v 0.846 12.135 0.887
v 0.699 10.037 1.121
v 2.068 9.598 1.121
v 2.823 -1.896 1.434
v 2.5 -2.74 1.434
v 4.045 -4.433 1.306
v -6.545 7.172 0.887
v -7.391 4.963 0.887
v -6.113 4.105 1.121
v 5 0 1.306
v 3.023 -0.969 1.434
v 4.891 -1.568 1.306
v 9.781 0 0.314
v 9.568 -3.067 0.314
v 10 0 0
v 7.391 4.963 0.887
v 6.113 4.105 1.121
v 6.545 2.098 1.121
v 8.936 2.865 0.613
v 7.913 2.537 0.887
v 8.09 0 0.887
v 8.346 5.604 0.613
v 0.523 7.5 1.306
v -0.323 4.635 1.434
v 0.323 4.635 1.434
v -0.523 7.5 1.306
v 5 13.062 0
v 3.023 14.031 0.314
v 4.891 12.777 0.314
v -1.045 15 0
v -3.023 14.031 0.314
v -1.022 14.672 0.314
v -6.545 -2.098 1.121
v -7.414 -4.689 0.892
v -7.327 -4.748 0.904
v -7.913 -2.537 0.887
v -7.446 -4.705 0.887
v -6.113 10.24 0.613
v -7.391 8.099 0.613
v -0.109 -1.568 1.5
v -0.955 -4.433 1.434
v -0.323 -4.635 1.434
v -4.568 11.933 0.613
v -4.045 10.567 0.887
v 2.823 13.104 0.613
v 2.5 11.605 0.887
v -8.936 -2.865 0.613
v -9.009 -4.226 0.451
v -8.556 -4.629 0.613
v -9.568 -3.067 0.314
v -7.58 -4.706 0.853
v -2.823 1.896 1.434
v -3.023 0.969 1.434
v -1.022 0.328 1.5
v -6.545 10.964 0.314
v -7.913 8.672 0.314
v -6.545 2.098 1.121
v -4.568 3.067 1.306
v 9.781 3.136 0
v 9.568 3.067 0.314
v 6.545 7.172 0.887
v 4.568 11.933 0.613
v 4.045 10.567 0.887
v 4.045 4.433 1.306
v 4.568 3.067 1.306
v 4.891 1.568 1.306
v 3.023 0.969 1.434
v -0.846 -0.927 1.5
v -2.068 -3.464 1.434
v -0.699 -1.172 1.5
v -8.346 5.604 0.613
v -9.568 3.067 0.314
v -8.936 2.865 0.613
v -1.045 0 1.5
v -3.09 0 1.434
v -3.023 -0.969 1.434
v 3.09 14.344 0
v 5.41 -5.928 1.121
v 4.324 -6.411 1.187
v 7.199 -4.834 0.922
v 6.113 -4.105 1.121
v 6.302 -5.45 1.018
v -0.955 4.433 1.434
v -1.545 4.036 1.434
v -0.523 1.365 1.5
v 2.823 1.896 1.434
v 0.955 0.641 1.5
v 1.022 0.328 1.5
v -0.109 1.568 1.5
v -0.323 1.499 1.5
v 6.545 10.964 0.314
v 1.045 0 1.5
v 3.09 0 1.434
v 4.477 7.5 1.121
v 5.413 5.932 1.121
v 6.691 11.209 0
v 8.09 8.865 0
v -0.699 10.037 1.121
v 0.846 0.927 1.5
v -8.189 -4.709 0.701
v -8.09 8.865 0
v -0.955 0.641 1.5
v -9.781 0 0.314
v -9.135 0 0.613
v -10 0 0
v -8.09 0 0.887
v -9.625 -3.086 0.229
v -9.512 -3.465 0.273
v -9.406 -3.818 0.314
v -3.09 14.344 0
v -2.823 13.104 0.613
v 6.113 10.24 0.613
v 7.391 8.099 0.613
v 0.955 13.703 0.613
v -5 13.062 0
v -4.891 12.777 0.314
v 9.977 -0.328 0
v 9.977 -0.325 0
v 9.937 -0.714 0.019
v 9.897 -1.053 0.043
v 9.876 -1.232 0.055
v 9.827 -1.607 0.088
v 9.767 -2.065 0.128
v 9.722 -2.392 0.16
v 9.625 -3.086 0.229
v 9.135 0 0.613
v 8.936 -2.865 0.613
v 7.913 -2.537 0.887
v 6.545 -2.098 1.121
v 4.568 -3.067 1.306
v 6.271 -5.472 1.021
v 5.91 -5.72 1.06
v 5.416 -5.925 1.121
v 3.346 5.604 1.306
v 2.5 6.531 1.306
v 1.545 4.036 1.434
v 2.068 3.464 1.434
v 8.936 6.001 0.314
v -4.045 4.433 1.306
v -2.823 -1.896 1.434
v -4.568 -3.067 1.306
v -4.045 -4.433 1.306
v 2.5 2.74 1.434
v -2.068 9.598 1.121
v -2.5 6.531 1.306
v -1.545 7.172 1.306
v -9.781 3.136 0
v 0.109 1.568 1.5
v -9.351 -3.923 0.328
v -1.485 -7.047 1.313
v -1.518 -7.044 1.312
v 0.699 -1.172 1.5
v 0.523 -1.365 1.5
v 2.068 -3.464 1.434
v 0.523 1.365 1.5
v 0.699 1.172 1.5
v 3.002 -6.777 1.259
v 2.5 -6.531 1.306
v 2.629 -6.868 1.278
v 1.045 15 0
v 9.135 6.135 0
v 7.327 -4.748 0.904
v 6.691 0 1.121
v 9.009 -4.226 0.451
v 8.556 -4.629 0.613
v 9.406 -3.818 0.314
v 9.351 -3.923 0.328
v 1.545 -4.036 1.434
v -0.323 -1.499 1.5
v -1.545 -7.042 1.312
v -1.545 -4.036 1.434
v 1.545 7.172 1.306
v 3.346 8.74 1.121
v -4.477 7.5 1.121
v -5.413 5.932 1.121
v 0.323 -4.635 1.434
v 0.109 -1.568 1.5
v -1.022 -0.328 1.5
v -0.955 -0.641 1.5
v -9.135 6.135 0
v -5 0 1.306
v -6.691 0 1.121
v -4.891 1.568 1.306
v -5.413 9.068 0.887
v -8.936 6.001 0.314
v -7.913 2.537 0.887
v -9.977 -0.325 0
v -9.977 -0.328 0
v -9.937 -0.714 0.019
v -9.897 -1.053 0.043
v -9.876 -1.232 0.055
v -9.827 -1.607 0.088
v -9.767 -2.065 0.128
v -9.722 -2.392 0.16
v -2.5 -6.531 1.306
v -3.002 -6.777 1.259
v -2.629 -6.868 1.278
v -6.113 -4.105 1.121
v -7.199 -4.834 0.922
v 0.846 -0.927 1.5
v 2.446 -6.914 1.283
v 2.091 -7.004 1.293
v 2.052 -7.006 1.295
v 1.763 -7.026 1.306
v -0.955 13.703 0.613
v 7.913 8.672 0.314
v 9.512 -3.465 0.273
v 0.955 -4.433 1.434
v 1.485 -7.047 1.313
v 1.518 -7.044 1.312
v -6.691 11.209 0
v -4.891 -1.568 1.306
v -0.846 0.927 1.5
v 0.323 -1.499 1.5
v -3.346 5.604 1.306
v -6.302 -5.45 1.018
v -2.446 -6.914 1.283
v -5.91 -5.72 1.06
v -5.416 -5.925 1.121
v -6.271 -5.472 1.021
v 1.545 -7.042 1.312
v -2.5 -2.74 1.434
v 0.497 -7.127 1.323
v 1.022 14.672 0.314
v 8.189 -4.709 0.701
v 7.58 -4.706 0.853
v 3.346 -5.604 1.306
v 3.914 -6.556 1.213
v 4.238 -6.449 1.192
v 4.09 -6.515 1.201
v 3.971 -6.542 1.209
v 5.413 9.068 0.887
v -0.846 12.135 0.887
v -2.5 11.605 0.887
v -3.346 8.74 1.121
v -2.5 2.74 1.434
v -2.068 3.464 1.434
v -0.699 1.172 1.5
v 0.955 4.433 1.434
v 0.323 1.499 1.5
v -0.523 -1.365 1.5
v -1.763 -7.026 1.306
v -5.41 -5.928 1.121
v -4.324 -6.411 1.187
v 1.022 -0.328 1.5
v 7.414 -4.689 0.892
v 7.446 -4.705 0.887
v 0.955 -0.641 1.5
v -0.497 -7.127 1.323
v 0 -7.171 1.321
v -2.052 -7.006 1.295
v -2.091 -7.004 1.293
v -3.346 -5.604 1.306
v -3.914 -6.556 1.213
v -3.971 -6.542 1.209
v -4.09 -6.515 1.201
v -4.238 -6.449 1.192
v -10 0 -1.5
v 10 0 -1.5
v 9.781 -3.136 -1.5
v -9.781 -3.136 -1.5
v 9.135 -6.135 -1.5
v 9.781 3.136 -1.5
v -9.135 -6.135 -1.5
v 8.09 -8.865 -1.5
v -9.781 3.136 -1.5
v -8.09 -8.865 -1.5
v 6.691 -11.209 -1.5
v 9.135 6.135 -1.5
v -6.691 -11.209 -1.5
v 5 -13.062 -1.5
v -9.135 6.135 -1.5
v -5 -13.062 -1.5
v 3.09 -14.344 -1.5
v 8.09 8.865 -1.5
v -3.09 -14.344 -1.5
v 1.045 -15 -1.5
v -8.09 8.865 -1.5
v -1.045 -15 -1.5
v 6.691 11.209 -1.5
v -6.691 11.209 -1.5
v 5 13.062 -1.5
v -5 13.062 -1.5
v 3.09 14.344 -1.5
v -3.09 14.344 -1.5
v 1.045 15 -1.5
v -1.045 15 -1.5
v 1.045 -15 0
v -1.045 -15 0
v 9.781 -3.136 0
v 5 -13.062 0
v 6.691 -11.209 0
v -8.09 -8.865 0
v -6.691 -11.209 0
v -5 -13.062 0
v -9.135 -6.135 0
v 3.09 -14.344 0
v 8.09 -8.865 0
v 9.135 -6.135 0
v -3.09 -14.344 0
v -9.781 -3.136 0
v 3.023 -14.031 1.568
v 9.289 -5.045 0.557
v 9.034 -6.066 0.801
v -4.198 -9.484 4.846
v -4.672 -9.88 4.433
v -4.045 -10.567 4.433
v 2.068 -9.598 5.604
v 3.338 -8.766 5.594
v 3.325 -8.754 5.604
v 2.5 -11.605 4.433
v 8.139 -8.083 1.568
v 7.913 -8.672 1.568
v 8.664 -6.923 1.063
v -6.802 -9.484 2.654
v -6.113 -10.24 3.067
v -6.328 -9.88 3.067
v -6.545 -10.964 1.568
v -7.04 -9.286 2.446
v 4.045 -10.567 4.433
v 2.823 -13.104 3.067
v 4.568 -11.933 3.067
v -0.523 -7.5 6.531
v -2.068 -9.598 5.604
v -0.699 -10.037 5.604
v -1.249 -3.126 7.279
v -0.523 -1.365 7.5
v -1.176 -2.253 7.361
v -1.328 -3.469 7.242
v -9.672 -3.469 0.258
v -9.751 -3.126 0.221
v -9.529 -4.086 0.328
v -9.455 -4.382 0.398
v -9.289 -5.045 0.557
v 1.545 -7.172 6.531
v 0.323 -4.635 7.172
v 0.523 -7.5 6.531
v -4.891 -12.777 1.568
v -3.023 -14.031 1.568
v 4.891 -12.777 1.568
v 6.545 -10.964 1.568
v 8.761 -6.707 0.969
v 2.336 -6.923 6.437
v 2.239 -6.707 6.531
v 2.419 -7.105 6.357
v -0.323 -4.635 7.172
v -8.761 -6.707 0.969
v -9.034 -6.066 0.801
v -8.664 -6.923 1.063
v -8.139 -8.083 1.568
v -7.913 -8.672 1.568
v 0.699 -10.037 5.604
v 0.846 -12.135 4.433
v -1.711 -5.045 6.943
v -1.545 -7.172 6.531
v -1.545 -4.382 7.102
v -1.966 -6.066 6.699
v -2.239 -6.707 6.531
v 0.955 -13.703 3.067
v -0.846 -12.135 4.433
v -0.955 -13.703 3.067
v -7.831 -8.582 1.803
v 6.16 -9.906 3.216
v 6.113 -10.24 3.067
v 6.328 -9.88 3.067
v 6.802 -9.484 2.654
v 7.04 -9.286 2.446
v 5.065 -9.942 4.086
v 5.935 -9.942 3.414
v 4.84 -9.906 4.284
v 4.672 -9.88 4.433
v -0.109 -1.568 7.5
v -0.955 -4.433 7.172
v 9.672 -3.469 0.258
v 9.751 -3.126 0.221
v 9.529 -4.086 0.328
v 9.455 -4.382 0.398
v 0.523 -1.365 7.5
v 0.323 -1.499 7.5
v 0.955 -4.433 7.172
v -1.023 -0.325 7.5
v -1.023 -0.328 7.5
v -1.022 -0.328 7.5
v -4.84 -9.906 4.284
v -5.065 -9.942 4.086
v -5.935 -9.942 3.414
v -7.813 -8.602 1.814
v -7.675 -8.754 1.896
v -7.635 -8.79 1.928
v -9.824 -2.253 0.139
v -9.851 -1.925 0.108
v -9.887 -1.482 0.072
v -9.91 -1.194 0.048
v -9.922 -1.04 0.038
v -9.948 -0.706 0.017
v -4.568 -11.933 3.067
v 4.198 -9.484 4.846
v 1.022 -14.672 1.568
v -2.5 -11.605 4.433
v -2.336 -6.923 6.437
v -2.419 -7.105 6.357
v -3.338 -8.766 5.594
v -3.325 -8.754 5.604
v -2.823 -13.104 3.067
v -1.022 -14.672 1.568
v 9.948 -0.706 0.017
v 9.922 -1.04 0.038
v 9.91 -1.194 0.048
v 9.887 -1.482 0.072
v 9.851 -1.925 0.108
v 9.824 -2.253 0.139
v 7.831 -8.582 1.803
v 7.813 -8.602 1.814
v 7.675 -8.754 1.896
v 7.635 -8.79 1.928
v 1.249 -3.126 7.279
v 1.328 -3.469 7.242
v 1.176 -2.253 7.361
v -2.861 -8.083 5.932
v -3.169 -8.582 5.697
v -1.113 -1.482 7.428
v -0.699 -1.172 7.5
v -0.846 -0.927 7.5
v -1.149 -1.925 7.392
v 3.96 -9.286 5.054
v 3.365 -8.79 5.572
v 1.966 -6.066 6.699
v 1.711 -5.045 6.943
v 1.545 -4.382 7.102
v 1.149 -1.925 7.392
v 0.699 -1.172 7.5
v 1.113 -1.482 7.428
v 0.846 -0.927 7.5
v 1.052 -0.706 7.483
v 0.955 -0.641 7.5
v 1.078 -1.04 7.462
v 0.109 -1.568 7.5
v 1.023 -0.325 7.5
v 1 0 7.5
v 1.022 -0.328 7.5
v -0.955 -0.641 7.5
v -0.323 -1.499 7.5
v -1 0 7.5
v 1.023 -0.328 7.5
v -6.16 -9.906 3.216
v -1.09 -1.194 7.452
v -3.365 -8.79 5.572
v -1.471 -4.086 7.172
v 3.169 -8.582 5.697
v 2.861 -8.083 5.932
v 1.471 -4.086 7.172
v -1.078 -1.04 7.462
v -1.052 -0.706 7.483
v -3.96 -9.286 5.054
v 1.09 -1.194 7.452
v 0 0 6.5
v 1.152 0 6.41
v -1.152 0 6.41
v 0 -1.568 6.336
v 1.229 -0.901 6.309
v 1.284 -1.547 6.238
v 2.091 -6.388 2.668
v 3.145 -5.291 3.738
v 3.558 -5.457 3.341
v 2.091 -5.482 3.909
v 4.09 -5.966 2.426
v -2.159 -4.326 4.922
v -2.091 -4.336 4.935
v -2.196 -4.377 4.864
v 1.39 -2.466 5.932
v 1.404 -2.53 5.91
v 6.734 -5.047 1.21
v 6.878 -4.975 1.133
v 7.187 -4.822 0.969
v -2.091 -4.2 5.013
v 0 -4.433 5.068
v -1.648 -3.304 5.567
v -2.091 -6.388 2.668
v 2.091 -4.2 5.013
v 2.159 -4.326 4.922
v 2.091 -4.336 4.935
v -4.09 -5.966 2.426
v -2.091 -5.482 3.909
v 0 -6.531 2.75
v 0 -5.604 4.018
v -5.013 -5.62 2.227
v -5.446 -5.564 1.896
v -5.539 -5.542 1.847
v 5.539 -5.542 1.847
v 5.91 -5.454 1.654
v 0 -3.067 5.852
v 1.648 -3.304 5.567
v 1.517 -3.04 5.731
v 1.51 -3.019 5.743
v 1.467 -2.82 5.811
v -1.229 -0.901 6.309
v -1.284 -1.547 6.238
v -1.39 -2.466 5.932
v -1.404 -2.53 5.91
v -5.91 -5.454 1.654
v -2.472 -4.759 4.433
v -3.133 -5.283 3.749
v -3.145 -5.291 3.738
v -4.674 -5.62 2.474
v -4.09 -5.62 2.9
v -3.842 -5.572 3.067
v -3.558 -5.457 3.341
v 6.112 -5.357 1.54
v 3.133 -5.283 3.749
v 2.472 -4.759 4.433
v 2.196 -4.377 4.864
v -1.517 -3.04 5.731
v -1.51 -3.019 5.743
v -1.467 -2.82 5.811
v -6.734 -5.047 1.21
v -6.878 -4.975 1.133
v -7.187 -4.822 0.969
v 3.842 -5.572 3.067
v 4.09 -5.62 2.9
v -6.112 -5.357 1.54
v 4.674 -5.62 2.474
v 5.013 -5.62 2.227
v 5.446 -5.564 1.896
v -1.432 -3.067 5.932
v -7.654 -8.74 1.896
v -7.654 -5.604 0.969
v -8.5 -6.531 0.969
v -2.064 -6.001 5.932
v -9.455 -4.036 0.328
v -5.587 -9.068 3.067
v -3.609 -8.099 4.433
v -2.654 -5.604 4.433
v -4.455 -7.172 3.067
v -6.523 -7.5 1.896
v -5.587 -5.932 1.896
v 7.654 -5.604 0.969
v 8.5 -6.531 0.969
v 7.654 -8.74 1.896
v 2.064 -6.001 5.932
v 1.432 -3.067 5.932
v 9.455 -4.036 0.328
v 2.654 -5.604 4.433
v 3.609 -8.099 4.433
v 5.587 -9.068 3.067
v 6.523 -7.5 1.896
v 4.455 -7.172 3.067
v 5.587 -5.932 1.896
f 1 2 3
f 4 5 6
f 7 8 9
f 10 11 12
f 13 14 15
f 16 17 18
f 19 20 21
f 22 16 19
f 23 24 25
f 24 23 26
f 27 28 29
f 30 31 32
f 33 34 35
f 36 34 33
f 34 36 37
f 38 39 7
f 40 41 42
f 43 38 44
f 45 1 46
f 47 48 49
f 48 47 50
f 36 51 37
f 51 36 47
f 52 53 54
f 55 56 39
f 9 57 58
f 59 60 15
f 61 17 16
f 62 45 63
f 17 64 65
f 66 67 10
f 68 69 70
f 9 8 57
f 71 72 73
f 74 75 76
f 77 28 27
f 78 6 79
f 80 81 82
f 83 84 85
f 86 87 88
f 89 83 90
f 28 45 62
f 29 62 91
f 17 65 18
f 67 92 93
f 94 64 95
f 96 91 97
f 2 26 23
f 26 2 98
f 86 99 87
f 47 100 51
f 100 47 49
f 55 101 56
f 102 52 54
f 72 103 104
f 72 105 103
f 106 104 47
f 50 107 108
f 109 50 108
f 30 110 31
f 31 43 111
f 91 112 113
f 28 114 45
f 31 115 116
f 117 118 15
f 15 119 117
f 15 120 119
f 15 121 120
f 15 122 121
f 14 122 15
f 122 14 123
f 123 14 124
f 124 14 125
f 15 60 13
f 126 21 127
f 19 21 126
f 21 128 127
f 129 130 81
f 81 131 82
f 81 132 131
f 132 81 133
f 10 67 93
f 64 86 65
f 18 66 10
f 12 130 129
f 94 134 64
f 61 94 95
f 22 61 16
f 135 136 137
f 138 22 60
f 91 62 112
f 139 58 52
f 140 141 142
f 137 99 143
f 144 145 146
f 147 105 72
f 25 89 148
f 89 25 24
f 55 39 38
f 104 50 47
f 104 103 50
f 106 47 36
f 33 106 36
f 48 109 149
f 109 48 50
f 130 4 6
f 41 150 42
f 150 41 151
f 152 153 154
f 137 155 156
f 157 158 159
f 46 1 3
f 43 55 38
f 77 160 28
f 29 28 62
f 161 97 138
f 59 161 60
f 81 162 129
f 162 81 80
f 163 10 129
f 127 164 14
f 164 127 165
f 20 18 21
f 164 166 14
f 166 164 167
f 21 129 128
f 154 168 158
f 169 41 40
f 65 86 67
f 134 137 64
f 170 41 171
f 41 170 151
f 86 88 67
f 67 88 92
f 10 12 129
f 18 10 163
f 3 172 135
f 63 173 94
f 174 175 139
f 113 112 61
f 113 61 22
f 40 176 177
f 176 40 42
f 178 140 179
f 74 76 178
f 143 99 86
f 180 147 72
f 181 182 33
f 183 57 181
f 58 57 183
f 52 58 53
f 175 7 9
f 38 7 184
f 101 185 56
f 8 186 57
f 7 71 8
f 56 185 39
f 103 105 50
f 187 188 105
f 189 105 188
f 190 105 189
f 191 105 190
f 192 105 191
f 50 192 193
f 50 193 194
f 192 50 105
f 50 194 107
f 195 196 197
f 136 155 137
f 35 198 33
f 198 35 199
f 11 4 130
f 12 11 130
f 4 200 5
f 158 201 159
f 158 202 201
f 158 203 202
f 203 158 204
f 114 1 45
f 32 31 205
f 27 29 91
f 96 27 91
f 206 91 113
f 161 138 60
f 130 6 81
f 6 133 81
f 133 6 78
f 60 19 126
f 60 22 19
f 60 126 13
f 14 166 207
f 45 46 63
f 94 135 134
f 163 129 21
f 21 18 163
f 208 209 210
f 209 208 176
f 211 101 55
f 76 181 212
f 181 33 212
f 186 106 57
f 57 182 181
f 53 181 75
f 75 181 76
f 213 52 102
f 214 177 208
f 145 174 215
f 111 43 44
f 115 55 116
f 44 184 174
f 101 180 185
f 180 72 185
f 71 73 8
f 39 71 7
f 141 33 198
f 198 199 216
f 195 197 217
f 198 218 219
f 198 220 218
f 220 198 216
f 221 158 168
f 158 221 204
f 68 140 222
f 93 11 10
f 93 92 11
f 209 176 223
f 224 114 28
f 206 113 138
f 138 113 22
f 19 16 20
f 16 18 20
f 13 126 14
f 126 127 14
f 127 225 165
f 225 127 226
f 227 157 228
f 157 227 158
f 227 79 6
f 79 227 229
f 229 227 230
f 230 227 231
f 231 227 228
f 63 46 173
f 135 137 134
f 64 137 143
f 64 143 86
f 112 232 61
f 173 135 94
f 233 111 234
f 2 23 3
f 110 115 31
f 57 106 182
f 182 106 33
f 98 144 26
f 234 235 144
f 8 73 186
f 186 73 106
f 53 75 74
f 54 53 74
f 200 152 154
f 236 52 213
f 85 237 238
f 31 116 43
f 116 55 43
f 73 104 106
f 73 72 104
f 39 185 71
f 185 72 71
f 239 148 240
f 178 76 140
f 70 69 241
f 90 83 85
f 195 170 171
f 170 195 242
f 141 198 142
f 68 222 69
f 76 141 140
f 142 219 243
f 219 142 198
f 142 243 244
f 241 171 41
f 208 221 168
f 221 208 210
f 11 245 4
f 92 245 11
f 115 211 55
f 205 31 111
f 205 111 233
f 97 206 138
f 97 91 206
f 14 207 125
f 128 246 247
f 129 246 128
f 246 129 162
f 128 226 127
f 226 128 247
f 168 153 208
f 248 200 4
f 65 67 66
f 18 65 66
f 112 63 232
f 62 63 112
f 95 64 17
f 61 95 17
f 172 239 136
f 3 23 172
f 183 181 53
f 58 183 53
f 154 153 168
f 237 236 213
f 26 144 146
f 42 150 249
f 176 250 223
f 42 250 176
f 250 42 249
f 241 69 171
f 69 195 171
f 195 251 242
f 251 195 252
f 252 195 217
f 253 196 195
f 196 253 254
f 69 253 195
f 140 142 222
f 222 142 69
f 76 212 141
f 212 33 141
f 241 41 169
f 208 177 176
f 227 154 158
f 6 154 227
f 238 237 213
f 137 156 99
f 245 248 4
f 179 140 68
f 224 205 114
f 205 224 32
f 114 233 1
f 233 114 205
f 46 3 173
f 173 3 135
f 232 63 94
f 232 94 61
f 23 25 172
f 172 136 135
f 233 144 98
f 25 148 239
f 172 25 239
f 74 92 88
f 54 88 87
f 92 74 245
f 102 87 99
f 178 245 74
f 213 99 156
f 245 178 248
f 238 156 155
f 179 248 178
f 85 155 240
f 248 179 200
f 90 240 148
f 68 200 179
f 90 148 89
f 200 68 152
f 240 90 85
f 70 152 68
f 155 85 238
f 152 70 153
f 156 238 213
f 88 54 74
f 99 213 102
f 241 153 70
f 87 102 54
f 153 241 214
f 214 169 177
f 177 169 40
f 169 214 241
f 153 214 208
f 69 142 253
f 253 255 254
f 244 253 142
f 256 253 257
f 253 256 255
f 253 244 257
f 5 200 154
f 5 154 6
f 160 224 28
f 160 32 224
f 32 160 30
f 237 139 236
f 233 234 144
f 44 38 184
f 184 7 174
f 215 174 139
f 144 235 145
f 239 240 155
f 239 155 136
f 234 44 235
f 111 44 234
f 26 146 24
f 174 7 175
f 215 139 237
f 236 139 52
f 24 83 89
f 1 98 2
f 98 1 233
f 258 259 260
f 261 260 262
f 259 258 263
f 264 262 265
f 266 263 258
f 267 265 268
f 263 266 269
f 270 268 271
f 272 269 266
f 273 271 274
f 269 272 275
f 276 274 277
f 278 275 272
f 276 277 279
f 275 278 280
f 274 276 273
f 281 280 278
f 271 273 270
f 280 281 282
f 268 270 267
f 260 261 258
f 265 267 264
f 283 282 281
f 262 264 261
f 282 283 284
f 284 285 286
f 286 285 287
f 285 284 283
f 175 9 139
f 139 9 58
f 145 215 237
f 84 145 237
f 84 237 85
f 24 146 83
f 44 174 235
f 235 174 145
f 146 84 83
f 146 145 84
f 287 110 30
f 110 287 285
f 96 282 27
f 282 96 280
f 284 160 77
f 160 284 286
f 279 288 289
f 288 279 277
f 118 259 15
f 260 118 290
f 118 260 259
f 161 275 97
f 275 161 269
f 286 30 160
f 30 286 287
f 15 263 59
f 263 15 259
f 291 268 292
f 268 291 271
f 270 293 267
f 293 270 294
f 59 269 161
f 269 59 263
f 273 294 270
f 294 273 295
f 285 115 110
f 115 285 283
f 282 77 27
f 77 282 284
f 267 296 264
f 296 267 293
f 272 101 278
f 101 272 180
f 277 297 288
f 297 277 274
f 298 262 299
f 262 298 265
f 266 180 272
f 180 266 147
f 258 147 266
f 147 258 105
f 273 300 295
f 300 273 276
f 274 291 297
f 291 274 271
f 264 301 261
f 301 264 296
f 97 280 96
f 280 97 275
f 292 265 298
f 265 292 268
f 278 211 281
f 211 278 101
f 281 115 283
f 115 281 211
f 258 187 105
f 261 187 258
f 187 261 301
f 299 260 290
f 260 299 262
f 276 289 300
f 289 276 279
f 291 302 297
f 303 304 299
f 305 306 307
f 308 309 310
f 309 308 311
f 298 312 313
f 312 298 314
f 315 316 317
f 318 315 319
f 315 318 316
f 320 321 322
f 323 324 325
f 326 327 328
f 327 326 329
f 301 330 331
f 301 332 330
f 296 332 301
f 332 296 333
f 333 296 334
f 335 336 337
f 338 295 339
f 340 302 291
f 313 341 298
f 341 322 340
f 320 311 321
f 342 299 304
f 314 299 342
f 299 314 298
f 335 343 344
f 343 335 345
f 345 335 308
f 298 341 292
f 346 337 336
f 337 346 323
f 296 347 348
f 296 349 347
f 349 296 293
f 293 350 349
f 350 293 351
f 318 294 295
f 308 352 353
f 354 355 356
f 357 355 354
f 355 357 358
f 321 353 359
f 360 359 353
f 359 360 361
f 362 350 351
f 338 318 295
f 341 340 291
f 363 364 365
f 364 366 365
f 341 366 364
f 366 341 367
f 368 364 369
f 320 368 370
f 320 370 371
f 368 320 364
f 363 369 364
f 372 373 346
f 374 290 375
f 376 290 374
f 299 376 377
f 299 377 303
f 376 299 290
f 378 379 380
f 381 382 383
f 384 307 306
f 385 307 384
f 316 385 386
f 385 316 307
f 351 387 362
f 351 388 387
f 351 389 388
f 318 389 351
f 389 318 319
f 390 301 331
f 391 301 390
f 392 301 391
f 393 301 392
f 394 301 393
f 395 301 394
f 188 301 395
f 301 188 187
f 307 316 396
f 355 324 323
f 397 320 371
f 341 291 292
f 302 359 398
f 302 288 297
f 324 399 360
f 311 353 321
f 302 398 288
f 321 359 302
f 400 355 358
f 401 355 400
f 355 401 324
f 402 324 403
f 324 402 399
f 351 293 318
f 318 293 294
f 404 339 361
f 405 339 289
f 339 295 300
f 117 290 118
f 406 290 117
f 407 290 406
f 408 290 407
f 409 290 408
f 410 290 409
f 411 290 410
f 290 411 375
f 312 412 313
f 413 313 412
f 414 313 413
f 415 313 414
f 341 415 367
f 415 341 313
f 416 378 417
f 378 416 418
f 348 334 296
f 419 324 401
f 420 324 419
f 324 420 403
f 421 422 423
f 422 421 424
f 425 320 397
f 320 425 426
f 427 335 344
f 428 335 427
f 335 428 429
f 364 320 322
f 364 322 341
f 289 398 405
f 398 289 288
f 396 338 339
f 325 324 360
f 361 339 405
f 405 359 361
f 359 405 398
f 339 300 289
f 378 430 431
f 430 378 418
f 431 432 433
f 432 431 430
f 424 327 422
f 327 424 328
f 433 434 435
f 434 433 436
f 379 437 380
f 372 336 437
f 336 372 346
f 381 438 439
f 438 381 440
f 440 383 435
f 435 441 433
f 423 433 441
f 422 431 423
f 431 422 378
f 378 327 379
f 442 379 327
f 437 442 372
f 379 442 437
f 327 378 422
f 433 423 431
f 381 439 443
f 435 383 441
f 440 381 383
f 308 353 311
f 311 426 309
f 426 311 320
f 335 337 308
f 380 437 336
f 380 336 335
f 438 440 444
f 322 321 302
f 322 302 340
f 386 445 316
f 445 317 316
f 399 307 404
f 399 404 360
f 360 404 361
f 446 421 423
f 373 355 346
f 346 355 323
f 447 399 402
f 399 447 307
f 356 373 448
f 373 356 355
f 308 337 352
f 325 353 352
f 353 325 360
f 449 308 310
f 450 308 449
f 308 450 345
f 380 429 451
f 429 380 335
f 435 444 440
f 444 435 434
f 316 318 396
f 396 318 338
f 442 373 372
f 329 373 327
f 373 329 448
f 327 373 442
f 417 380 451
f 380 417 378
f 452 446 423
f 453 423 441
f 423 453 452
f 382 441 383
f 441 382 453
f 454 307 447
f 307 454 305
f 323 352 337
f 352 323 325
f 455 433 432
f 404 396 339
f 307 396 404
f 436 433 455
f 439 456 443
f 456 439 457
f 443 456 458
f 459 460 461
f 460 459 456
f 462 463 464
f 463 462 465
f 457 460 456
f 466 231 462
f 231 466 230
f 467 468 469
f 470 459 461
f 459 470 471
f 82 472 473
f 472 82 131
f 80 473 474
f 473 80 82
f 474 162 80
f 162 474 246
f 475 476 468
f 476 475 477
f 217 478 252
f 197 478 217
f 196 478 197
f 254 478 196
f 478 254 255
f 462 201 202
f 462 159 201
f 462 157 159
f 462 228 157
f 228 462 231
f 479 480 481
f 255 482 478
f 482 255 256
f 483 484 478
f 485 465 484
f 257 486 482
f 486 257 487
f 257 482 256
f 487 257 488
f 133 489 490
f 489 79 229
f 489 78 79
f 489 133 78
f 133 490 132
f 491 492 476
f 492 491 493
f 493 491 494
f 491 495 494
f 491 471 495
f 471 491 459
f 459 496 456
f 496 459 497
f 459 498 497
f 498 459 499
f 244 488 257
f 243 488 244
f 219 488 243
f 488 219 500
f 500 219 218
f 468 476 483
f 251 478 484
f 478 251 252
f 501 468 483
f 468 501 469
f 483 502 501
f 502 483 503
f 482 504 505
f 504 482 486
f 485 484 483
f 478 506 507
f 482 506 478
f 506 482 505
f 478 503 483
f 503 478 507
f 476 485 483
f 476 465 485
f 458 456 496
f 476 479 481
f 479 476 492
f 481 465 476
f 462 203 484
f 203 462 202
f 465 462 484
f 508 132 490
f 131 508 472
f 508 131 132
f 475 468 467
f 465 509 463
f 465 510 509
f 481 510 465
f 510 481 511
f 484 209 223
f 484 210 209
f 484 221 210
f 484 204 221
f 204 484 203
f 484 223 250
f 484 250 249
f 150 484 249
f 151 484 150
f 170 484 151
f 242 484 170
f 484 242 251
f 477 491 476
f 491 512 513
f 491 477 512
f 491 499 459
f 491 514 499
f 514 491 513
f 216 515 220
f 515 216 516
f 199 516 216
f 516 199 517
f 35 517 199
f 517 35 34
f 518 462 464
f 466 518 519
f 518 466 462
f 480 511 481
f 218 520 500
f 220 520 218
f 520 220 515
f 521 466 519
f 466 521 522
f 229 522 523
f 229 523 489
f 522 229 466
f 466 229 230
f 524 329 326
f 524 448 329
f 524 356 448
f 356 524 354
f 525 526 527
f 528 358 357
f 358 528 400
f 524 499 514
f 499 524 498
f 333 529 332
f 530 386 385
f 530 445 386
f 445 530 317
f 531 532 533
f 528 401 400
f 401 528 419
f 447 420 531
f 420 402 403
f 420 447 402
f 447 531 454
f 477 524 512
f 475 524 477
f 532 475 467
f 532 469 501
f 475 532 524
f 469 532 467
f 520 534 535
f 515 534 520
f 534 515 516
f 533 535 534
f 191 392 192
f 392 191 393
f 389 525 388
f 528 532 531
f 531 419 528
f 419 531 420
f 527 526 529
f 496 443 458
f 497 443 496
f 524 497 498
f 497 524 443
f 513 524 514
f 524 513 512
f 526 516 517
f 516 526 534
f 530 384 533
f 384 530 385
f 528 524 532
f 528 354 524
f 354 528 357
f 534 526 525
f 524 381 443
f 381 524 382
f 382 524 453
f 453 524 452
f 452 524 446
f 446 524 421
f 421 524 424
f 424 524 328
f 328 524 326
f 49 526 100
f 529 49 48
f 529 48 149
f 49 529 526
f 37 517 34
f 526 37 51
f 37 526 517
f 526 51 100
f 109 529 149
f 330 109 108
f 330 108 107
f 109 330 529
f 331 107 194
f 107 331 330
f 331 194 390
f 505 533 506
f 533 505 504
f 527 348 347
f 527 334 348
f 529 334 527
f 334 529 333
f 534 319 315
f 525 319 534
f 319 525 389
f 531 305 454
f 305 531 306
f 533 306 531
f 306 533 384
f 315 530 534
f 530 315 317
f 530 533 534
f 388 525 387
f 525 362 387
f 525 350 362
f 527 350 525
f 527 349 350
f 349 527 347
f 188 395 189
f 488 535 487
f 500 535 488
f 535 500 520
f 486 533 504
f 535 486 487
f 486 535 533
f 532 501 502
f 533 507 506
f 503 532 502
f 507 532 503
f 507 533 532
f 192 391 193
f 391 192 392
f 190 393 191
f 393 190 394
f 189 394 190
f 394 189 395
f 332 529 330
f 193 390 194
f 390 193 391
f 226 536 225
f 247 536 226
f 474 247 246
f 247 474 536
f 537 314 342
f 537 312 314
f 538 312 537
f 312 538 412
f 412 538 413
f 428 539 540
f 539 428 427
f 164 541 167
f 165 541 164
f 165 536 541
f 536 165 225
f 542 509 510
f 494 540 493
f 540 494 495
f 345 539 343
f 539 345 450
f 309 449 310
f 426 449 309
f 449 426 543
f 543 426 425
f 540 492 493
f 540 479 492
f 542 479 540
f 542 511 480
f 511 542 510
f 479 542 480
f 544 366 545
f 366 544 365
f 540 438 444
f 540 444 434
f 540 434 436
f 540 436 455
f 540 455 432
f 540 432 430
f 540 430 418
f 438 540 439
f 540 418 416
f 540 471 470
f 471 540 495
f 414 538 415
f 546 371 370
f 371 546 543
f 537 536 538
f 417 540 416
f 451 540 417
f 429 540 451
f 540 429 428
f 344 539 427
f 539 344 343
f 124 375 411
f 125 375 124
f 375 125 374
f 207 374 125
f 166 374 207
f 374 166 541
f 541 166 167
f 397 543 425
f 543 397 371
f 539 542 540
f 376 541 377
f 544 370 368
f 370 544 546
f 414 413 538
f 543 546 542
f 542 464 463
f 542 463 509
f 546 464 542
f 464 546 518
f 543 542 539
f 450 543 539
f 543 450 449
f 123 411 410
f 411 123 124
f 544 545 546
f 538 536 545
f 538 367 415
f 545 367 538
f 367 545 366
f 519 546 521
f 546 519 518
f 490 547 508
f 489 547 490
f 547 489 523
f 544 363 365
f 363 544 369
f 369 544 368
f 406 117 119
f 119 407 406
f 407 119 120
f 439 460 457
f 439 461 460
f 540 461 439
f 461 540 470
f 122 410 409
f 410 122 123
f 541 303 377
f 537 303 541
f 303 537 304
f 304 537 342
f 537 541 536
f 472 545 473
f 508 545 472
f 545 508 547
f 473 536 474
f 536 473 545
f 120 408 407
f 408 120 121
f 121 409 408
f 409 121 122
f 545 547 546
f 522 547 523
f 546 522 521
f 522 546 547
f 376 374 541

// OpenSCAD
hook_distance=15;
base_thickness=3;
base_height=30;
base_width=20;
fixing_hole=0;//[0:OFF,1:ON]
Sfn=30;

module Base()
{
resize([base_width,base_height,3])sphere(r=10,center=true,$fn=Sfn);
translate([0,0,-base_thickness/4])
{
resize([base_width,base_height,0])cylinder(base_thickness/2,r=10,center=true,$fn=Sfn);
}
}

module Hook()
{
difference() {
resize([base_width,base_height,hook_distance])sphere(r=10,center=true,$fn=Sfn);
translate([0,0,-hook_distance/2])
{
cube([base_width+1,base_height+1,hook_distance],center=true);
}
translate([0,base_height/2,hook_distance/2])
{
cube([base_width+1,base_height,hook_distance],center=true);
}


translate([0,0,-1])
{
rotate ([0,90,0]) 
resize([hook_distance,base_height/2,base_width])sphere (hook_distance,base_width, center = true, $fn=Sfn);
}


translate([-base_width/2-1,0,hook_distance/2])
{
resize([base_width,base_height,hook_distance])sphere(r=10,center=true,$fn=Sfn);
}
translate([base_width/2+1,0,hook_distance/2])
{
resize([base_width,base_height,hook_distance])sphere(r=10,center=true,$fn=Sfn);
}

}
}

module Hole()
{
if(fixing_hole > 0)
{
translate([0,base_height/5,1.5])
{

cylinder(base_thickness*2,d=fixing_hole,center=true,$fn=Sfn);
cylinder(h = fixing_hole, d1 = fixing_hole, d2 = fixing_hole*2, center = true,$fn=Sfn);

}
}
}

difference()
{
Base();
Hole();
}
Hook();



